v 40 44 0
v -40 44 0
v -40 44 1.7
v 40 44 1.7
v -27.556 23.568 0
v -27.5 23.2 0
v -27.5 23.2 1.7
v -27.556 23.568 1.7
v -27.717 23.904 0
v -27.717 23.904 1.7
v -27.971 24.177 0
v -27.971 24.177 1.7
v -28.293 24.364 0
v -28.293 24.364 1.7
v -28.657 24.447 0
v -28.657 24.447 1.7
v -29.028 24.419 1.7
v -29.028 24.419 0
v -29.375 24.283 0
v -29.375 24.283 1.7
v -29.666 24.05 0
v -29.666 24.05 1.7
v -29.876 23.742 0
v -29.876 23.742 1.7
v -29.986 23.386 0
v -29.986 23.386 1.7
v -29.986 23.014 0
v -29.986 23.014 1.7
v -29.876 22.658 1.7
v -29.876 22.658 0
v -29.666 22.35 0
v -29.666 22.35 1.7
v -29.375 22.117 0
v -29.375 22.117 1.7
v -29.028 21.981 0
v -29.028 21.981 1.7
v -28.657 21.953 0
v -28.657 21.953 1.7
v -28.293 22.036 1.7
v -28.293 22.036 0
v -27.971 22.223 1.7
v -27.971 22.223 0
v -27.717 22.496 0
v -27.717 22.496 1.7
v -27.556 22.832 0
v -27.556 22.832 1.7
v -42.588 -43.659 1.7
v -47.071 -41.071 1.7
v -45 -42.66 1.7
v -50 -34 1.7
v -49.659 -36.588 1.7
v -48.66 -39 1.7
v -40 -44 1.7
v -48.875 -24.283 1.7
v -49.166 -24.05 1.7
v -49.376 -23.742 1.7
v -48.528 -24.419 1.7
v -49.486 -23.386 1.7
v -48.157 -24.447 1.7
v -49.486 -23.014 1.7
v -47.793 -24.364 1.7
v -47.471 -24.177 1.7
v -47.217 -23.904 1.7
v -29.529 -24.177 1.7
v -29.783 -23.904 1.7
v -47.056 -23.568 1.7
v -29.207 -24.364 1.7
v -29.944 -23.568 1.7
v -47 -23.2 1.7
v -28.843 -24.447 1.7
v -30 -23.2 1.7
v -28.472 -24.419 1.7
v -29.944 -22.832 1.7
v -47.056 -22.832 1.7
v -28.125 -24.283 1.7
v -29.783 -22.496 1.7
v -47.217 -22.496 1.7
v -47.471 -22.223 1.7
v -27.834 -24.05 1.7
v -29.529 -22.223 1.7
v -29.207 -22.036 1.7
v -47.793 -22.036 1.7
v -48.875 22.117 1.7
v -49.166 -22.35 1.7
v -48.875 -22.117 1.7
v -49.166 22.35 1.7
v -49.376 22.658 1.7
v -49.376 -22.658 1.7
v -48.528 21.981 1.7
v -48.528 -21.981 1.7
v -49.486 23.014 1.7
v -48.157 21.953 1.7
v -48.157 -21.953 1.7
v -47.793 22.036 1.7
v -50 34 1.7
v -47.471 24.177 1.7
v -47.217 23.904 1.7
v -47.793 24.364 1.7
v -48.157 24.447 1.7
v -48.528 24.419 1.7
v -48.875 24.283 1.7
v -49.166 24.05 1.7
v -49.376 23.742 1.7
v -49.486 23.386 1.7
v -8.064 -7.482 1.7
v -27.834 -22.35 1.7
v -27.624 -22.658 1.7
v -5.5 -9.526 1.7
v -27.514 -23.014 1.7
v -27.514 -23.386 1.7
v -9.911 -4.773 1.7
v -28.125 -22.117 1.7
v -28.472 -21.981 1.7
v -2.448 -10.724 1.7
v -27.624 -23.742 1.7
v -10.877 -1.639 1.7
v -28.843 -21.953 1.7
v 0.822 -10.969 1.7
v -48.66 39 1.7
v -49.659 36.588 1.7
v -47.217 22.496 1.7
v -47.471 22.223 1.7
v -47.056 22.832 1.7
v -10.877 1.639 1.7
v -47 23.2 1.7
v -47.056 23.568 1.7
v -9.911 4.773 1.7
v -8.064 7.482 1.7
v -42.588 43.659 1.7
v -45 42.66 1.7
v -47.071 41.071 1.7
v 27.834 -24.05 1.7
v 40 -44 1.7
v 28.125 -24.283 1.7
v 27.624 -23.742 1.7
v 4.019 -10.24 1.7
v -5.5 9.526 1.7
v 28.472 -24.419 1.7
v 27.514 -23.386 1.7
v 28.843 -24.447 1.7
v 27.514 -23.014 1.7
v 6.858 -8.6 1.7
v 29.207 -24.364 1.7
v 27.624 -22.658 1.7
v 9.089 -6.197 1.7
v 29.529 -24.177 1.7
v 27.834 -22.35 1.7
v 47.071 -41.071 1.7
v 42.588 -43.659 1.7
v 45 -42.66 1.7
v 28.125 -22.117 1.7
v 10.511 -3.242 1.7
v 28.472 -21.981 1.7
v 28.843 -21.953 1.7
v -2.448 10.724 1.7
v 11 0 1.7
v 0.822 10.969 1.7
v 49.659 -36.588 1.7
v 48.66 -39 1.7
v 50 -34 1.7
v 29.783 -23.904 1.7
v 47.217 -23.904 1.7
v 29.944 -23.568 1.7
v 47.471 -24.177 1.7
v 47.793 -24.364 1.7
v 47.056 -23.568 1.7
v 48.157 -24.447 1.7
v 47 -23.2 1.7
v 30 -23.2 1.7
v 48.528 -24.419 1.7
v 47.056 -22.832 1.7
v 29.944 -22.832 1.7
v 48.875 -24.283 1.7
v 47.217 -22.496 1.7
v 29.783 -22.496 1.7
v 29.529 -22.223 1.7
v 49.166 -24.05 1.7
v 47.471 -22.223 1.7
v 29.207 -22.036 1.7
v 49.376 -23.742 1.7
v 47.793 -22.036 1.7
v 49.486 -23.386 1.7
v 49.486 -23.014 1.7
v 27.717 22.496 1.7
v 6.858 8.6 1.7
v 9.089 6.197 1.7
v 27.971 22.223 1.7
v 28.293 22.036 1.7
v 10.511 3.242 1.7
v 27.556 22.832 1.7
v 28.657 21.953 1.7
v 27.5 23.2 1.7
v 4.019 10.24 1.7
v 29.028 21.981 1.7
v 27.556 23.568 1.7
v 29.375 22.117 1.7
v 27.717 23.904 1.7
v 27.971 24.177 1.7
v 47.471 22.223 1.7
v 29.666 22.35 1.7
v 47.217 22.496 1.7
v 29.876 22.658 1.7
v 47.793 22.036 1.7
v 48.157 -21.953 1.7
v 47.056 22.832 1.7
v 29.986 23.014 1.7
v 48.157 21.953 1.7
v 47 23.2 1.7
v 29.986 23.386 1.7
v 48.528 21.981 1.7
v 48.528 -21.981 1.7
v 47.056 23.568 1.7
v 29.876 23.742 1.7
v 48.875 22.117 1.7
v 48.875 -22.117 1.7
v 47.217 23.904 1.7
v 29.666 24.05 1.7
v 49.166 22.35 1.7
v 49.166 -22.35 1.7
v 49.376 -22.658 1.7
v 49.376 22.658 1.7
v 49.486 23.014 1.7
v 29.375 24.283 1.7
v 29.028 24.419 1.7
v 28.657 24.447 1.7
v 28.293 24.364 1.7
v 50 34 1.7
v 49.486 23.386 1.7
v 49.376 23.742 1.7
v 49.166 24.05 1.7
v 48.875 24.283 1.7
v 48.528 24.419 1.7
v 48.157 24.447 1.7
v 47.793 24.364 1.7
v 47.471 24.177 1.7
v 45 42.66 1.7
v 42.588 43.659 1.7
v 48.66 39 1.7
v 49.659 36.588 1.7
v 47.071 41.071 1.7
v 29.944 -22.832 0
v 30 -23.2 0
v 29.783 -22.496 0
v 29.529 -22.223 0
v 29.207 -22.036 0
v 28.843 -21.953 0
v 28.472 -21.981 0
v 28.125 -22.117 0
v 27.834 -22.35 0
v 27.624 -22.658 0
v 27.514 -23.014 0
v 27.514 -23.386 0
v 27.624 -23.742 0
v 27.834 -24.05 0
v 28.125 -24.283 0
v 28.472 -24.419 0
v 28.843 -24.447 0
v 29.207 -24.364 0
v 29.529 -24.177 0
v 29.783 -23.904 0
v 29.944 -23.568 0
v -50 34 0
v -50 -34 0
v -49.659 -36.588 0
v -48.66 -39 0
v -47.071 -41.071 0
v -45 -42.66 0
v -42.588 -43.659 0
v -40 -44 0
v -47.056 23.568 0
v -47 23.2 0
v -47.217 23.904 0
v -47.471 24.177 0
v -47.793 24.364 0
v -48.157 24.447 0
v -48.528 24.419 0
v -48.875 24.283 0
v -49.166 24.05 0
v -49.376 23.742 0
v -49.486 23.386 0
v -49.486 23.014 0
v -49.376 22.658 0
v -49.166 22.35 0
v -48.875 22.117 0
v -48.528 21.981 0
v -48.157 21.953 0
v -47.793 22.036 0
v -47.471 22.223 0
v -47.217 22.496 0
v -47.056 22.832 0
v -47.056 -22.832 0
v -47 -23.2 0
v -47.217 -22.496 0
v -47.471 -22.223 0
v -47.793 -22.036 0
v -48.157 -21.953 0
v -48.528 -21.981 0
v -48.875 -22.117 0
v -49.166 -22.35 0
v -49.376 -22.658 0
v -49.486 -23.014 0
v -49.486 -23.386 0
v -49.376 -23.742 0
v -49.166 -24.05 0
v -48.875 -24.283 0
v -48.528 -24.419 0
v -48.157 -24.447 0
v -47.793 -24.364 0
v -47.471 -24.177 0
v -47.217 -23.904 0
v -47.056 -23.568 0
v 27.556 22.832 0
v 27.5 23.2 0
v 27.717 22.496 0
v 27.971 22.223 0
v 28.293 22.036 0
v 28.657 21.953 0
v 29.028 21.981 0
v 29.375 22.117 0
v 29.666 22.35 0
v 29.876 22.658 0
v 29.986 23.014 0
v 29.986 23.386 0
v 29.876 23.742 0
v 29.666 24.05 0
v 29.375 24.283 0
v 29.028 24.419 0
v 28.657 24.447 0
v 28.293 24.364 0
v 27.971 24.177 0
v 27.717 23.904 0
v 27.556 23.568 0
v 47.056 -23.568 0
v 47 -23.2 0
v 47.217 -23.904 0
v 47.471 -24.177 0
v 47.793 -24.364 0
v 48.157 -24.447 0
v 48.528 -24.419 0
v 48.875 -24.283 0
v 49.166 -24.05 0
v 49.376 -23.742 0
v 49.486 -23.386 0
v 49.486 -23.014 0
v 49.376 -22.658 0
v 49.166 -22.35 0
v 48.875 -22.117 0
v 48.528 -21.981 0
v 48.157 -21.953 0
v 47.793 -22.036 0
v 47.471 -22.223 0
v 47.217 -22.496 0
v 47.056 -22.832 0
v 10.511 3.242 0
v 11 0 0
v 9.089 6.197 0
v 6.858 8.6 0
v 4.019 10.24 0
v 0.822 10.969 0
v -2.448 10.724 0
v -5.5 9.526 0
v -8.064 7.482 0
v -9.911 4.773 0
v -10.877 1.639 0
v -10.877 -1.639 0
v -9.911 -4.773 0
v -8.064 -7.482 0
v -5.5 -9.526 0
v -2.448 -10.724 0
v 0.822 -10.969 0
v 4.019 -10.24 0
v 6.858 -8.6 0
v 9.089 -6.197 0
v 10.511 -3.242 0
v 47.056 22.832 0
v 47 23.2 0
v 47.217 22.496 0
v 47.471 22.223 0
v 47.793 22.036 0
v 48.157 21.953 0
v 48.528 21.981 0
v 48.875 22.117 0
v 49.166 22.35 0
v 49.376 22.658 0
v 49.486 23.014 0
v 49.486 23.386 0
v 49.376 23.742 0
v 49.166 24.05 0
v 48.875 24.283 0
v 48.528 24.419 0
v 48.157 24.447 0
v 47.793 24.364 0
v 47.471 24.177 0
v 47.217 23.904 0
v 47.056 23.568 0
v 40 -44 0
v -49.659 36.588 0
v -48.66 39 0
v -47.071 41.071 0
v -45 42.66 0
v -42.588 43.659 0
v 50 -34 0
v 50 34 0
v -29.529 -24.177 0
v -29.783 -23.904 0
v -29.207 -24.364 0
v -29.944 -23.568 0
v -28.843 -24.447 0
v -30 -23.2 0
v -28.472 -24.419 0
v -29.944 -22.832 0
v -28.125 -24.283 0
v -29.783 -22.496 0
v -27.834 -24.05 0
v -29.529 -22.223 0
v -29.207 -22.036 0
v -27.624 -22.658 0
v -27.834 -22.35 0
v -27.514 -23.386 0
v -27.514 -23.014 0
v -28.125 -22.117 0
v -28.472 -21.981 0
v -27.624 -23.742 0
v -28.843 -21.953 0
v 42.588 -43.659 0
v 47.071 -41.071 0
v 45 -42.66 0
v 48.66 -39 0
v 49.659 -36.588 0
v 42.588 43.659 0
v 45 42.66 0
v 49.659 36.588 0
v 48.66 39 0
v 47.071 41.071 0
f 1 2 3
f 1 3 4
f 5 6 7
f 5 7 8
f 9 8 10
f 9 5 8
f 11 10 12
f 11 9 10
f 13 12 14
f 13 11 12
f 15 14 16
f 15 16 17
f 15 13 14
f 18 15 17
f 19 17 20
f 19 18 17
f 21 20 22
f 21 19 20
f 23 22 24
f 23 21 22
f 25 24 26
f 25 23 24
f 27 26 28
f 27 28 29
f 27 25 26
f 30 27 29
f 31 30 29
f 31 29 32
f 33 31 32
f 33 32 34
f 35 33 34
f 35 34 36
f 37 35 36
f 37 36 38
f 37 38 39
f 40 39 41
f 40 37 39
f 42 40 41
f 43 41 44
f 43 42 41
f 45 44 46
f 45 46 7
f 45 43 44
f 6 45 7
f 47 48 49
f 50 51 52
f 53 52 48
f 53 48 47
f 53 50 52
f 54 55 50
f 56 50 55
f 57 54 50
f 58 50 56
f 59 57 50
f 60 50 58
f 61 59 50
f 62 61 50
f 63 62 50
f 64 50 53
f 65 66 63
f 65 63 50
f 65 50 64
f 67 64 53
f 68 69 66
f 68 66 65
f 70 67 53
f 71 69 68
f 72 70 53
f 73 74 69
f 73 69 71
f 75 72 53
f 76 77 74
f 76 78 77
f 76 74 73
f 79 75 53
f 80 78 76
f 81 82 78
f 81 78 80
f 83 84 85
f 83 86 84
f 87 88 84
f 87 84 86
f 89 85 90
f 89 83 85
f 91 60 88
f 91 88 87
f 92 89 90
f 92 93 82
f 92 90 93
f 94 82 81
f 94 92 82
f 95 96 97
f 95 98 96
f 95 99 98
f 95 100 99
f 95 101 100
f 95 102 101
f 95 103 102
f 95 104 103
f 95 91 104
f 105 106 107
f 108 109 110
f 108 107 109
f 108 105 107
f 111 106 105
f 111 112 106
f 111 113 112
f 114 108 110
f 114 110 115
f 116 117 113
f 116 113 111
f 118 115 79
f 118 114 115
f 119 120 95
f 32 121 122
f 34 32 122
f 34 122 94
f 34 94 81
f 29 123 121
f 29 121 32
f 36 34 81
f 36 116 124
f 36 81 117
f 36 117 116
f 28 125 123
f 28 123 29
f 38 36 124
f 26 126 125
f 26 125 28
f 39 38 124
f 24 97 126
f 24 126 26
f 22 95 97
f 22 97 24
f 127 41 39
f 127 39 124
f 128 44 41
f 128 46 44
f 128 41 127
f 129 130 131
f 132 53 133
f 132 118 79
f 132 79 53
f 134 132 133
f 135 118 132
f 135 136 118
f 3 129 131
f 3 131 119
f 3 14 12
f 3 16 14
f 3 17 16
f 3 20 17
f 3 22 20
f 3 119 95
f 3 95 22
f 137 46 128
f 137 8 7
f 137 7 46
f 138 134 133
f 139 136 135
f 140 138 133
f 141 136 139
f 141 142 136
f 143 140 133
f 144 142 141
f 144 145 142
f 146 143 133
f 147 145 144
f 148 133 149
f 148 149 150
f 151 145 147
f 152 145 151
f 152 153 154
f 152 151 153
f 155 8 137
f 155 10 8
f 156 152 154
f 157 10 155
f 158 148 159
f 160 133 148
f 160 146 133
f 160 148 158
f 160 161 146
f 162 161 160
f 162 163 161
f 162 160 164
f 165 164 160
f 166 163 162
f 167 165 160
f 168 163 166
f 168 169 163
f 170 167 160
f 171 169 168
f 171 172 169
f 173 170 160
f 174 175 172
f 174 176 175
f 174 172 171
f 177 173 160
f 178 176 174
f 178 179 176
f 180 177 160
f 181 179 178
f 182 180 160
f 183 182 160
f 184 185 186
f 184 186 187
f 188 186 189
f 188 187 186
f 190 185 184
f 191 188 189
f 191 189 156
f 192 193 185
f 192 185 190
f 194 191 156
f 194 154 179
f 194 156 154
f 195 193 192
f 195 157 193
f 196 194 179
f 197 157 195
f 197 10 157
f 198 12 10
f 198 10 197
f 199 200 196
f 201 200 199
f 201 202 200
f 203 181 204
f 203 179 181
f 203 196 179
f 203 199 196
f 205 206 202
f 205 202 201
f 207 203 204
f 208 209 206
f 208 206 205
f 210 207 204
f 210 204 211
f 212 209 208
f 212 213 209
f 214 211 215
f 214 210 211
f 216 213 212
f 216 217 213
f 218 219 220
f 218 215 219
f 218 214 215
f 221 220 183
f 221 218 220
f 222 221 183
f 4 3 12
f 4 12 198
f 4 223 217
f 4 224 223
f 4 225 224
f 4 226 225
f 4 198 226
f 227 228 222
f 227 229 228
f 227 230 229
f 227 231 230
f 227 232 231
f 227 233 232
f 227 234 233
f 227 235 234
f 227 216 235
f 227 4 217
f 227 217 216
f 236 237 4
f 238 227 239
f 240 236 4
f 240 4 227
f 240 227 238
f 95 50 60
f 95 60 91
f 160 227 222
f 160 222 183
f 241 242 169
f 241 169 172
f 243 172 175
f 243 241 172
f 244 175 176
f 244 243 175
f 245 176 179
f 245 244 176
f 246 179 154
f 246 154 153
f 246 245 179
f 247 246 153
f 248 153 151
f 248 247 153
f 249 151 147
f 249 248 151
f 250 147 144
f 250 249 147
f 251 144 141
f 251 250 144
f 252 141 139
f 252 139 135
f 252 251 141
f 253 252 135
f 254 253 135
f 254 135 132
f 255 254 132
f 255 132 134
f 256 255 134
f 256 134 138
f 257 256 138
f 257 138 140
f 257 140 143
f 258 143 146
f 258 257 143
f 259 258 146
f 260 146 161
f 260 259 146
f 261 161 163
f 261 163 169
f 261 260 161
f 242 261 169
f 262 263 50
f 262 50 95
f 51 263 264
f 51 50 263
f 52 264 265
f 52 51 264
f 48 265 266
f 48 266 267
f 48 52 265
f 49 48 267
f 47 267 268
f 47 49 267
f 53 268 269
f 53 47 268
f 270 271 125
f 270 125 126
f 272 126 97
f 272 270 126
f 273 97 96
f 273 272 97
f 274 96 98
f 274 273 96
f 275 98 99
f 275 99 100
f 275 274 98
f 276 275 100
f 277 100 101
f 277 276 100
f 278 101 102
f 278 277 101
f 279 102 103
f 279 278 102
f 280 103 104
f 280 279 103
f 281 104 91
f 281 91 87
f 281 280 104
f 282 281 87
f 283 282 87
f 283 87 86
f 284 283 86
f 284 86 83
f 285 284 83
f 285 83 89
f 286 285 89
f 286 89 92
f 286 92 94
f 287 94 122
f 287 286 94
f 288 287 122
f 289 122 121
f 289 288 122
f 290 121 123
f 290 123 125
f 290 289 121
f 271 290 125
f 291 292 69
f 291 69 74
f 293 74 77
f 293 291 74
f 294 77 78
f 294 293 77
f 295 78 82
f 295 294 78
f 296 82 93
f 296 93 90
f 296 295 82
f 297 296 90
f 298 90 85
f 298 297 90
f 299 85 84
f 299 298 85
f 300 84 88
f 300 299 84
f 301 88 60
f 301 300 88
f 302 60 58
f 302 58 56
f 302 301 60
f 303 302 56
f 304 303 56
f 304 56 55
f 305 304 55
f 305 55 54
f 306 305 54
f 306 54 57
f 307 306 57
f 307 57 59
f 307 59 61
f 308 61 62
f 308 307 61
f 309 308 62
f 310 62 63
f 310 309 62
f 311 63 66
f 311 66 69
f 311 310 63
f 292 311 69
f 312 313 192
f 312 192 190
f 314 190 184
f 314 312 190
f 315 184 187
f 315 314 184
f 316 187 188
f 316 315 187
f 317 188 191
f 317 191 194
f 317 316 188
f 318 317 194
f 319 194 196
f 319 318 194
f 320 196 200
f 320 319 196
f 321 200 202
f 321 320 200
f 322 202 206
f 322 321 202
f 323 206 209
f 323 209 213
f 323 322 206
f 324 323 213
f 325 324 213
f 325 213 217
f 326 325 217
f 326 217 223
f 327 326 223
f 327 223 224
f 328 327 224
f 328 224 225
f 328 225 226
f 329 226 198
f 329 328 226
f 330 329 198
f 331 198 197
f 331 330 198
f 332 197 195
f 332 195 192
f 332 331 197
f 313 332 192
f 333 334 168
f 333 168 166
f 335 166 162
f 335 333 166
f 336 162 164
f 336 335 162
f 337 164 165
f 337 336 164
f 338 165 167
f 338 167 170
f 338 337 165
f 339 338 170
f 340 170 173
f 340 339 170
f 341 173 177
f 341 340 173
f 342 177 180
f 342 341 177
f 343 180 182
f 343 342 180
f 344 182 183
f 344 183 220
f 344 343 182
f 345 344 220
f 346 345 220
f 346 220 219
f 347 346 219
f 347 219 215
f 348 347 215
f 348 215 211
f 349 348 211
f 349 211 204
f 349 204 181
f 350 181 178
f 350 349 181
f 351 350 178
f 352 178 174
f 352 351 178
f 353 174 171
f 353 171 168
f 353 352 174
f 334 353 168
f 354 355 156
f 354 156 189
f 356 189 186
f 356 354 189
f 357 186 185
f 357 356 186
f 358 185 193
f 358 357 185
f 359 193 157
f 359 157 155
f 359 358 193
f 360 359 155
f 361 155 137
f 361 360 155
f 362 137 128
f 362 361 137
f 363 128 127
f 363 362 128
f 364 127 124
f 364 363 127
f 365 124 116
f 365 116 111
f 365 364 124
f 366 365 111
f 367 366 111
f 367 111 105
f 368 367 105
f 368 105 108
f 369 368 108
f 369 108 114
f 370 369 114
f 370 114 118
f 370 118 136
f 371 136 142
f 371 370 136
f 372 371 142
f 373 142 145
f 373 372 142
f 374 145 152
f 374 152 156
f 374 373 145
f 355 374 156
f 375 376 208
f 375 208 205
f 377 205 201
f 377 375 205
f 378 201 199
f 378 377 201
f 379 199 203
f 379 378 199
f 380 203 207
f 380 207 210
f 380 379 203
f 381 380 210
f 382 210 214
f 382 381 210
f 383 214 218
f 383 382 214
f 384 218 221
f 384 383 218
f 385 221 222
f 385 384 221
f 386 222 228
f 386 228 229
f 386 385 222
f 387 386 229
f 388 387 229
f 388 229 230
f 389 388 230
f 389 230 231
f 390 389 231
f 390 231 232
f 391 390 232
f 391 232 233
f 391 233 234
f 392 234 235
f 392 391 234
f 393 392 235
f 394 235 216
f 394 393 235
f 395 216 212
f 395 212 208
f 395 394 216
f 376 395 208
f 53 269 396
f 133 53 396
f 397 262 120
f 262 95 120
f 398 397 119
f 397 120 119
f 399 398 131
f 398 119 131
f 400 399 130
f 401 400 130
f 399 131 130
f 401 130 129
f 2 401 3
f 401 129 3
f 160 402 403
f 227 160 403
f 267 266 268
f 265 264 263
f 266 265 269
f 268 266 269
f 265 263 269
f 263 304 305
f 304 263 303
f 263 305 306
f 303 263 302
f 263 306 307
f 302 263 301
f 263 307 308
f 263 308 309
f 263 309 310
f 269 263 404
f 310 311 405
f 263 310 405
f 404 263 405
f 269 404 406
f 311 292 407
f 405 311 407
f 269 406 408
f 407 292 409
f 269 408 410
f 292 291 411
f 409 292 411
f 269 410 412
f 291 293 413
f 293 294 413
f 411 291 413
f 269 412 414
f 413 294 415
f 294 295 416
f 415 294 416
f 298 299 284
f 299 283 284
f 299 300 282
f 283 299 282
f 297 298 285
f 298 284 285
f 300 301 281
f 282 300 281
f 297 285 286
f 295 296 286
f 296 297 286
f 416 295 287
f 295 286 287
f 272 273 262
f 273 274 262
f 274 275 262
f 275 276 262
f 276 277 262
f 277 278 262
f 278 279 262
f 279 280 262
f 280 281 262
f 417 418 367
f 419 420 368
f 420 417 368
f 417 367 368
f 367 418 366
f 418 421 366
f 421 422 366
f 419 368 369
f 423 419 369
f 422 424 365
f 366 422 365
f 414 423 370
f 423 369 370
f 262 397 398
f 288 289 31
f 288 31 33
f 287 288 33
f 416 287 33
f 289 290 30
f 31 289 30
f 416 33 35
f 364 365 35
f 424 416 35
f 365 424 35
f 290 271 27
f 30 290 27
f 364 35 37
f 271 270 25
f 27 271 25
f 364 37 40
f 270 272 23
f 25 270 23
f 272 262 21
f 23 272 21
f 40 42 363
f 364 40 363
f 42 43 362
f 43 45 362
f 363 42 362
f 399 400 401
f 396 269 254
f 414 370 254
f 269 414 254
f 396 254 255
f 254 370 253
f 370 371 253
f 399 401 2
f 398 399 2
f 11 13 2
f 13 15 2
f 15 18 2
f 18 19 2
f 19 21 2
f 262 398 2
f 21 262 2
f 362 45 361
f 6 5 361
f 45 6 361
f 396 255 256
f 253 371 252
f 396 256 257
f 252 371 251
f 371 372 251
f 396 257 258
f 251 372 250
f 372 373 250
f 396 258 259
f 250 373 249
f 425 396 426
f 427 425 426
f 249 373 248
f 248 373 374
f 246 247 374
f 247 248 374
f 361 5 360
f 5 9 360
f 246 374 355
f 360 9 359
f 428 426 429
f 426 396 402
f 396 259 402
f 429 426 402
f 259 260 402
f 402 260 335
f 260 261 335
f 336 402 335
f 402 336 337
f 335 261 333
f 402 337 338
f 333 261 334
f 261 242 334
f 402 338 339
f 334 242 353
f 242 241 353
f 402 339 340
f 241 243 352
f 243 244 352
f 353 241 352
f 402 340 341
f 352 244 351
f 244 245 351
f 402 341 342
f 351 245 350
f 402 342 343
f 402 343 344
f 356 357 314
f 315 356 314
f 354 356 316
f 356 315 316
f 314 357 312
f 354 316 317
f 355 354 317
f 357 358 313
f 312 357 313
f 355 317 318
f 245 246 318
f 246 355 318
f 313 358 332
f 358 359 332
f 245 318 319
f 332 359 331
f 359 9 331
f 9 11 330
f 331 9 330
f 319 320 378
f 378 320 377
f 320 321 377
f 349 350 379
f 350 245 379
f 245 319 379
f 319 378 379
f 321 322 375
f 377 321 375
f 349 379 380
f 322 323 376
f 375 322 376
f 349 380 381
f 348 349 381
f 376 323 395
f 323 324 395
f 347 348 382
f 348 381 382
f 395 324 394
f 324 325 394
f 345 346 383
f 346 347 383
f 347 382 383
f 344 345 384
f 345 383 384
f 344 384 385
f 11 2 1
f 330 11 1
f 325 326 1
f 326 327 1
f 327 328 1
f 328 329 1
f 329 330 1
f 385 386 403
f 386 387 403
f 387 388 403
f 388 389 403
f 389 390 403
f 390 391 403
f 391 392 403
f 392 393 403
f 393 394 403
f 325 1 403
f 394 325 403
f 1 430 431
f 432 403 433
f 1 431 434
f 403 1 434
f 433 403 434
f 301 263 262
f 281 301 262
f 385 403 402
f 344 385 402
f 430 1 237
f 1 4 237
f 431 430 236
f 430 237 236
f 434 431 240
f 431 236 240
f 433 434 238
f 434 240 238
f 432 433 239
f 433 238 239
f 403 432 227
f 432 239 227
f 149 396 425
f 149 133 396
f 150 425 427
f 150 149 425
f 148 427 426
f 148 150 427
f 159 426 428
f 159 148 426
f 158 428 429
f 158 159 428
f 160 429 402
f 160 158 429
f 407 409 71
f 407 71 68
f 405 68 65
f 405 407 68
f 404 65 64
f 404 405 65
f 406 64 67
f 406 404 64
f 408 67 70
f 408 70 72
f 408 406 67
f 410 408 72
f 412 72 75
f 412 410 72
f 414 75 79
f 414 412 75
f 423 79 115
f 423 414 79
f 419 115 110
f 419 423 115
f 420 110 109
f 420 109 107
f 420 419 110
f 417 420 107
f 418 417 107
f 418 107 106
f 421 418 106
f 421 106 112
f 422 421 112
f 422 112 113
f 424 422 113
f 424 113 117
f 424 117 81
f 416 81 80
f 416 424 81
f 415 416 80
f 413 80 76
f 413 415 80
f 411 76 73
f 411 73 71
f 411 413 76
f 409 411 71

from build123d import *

# Parameters (mm, degrees)
SKETCH_1_W      = 100
SKETCH_1_H      = 88
SKETCH_1_R      = 1.25
SKETCH_1_R_2    = 11
EXTRUDE_1_DEPTH = 1.7
FILLET_1_R      = 10


with BuildPart() as part:
    # 草图1 → 凸台-拉伸1 (new body)
    with BuildSketch(Plane.XY):
        Rectangle(SKETCH_1_W, SKETCH_1_H)
        with Locations((-48.25, 23.2)):
            Circle(SKETCH_1_R, mode=Mode.SUBTRACT)
        with Locations((-48.25, -23.2)):
            Circle(SKETCH_1_R, mode=Mode.SUBTRACT)
        with Locations(Location((48.25, -23.2, 0), (0, 0, 180))):
            Circle(SKETCH_1_R, mode=Mode.SUBTRACT)
        with Locations(Location((48.25, 23.2, 0), (0, 0, 180))):
            Circle(SKETCH_1_R, mode=Mode.SUBTRACT)
        Circle(SKETCH_1_R_2, mode=Mode.SUBTRACT)
        with Locations((-28.75, 23.2)):
            Circle(SKETCH_1_R, mode=Mode.SUBTRACT)
        with Locations(Location((-28.75, -23.2, 0), (0, 0, 180))):
            Circle(SKETCH_1_R, mode=Mode.SUBTRACT)
        with Locations((28.75, -23.2)):
            Circle(SKETCH_1_R, mode=Mode.SUBTRACT)
        with Locations(Location((28.75, 23.2, 0), (0, 0, 180))):
            Circle(SKETCH_1_R, mode=Mode.SUBTRACT)
    extrude(amount=EXTRUDE_1_DEPTH)

    # 圆角1
    fillet_1_edges = [part.edges().sort_by_distance(p)[0] for p in [
        (50, -44, 0.85),
        (-50, -44, 0.85),
        (-50, 44, 0.85),
        (50, 44, 0.85),
    ]]
    fillet(fillet_1_edges, radius=FILLET_1_R)


solid = part.part
